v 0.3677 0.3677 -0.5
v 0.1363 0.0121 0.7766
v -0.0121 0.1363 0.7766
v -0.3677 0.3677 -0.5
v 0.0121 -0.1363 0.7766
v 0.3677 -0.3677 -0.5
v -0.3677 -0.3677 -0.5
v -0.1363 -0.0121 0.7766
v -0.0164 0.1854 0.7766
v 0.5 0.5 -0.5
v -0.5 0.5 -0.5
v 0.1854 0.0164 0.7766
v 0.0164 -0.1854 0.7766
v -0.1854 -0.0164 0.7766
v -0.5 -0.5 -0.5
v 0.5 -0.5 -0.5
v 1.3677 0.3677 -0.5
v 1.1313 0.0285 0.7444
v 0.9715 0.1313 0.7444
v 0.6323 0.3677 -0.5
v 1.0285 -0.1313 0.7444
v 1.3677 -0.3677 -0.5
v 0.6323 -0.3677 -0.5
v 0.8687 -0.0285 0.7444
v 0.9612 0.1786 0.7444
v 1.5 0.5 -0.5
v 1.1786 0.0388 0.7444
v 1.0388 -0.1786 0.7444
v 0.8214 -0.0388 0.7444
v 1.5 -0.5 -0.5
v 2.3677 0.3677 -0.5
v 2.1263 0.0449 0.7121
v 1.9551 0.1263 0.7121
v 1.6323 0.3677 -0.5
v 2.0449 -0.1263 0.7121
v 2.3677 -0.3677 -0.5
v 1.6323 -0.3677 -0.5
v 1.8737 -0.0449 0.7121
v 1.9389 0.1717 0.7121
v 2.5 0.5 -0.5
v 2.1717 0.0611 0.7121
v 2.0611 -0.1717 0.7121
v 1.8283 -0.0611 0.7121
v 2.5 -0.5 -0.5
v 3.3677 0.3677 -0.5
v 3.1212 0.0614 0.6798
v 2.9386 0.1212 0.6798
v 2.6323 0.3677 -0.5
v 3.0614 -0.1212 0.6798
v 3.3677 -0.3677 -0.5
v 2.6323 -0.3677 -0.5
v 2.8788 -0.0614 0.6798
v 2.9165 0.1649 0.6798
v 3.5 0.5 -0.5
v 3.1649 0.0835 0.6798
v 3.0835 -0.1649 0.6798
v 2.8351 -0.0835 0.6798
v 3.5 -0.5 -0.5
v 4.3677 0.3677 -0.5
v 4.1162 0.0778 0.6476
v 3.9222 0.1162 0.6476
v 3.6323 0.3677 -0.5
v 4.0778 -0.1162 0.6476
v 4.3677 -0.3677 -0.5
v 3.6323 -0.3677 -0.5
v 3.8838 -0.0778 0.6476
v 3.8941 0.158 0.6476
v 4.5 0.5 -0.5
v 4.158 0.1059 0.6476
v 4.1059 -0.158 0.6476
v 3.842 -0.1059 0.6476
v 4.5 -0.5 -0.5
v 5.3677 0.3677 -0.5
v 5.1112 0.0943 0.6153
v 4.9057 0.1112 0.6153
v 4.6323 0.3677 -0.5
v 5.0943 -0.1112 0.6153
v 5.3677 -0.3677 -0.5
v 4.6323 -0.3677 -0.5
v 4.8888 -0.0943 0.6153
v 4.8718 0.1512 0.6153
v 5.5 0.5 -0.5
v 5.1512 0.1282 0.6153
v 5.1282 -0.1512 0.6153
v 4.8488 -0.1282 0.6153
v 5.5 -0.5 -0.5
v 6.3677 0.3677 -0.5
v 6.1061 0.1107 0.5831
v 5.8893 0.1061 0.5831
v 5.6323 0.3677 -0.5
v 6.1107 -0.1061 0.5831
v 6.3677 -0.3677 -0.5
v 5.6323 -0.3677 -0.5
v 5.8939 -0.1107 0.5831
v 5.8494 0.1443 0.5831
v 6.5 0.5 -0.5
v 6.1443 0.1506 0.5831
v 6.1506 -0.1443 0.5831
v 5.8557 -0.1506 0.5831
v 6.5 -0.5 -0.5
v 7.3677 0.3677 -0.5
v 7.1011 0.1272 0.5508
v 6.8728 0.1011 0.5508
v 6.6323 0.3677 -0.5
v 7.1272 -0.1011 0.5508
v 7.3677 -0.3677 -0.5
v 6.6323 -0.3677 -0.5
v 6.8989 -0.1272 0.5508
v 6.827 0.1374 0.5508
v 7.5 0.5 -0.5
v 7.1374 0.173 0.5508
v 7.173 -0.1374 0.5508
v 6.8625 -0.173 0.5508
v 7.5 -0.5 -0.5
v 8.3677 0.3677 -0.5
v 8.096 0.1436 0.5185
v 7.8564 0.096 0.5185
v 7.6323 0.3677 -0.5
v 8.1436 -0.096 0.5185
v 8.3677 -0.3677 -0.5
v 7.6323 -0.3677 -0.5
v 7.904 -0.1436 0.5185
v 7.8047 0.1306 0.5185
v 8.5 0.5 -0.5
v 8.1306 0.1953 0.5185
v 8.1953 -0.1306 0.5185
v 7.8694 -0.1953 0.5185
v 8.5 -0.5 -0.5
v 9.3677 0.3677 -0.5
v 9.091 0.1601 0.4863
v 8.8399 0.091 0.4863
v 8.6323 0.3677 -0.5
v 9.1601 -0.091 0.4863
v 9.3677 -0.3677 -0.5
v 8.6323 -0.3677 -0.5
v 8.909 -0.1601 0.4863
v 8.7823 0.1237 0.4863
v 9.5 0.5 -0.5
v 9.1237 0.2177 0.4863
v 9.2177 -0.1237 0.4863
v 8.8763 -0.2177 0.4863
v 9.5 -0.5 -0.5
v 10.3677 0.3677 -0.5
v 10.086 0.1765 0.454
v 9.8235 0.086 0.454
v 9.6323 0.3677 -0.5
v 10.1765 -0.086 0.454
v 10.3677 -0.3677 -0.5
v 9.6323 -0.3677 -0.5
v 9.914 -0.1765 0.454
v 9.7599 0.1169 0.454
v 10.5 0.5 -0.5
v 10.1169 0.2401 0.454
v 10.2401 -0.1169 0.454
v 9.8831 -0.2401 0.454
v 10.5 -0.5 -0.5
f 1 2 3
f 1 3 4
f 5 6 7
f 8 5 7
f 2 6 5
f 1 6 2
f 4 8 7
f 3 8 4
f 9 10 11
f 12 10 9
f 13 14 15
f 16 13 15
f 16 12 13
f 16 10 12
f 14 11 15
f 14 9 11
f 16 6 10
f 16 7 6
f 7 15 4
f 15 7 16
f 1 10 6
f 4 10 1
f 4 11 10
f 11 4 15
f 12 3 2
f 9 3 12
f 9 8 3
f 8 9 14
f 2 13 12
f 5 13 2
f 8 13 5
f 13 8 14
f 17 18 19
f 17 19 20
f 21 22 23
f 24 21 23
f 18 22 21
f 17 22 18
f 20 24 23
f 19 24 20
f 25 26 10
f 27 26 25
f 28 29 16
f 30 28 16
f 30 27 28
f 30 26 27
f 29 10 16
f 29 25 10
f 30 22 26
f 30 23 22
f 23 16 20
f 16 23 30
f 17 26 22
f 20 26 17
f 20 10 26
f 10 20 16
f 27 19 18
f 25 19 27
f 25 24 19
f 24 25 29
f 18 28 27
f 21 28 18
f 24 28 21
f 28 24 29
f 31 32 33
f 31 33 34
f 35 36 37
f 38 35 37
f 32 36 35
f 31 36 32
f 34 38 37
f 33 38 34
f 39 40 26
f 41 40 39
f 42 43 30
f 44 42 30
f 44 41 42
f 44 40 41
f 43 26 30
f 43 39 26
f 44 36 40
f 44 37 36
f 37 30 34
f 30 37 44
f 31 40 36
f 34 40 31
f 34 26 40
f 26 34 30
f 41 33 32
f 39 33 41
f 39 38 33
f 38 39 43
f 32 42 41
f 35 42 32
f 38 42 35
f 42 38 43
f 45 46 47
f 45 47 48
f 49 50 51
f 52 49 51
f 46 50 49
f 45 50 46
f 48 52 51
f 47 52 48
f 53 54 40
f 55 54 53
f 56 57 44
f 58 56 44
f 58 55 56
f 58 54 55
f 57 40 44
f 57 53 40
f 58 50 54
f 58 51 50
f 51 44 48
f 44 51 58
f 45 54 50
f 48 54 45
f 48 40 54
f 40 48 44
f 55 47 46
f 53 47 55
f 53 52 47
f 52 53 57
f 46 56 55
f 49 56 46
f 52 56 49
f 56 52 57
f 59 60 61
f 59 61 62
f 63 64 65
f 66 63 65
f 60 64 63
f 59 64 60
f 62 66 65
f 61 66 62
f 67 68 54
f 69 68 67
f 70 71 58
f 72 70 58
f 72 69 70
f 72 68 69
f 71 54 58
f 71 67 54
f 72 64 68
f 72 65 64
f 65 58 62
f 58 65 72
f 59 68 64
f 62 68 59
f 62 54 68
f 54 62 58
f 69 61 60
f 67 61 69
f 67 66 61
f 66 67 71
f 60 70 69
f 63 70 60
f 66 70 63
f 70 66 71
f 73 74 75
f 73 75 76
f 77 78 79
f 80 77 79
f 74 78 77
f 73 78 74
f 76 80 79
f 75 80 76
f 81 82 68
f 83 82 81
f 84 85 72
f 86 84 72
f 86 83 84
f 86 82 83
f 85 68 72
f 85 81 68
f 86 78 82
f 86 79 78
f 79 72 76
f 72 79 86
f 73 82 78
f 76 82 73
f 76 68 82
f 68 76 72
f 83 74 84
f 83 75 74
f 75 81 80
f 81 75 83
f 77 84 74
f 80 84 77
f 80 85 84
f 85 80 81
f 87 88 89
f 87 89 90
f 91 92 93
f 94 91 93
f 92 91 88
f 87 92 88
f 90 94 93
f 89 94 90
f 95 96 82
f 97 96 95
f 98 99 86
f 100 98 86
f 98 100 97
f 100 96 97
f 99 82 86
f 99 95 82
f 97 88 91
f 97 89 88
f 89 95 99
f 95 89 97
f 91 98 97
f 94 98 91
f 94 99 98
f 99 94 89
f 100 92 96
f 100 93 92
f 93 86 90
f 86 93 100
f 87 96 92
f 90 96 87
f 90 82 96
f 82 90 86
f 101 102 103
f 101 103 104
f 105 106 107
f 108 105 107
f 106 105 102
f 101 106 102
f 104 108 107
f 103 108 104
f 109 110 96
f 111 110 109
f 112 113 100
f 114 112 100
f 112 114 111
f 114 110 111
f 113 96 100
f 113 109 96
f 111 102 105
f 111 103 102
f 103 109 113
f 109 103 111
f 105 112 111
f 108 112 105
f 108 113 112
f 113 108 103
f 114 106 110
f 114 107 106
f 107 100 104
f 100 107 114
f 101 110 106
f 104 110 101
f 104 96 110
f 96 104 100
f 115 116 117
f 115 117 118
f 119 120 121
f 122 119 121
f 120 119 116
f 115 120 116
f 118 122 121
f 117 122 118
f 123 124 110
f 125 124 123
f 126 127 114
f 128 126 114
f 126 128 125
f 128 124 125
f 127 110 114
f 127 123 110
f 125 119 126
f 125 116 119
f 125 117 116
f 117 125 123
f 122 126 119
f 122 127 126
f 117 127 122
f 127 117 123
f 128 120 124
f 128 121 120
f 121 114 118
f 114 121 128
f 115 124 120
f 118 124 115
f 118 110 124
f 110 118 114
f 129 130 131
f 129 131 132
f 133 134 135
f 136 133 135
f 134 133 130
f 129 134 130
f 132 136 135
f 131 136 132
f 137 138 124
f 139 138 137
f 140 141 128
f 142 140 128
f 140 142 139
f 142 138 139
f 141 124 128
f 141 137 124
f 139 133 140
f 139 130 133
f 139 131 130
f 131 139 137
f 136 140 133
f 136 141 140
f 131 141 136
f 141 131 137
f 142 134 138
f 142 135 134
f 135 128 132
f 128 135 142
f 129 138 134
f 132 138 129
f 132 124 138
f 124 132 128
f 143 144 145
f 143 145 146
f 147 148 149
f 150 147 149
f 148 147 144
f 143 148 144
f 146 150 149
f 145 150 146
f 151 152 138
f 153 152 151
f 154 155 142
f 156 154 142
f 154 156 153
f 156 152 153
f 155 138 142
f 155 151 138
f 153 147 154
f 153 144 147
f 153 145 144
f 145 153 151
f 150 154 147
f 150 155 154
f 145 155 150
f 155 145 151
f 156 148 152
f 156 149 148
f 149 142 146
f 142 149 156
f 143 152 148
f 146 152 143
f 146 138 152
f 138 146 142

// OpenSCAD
//Start with Dimensions
pvalue = 20; // [10.0:20.0]
/* [Hidden] */

points_01 = [[-0.048376, -0.463729, 0.131425], [0.463729, -0.048376, 0.131425], [-0.463729, 0.048376, 0.131425], [0.048376, 0.463729, 0.131425], [-0.5, 0.5, -0.5], [0.5, 0.5, -0.5], [-0.5, -0.5, -0.5], [0.5, -0.5, -0.5], [-0.341008, 0.035574, 0.131425], [0.035574, 0.341008, 0.131425], [0.36768, 0.36768, -0.5], [-0.36768, 0.36768, -0.5], [-0.36768, -0.36768, -0.5], [0.36768, -0.36768, -0.5], [0.341008, -0.035574, 0.131425], [-0.035574, -0.341008, 0.131425]];
triangles_01 = [[8, 9, 11], [11, 9, 10], [12, 13, 15], [15, 13, 14], [13, 10, 14], [14, 10, 9], [15, 8, 12], [12, 8, 11], [2, 4, 3], [3, 4, 5], [6, 0, 7], [7, 0, 1], [3, 5, 1], [1, 5, 7], [4, 2, 6], [6, 2, 0], [2, 3, 8], [8, 3, 9], [5, 4, 10], [10, 4, 11], [6, 7, 12], [12, 7, 13], [1, 0, 14], [14, 0, 15], [7, 5, 13], [13, 5, 10], [3, 1, 9], [9, 1, 14], [0, 2, 15], [15, 2, 8], [4, 6, 11], [11, 6, 12]];

points_02 = [[-0.185412, -0.01639, 0.776613], [0.01639, -0.185412, 0.776613], [-0.01639, 0.185412, 0.776613], [0.185412, 0.01639, 0.776613], [-0.5, 0.5, -0.5], [0.5, 0.5, -0.5], [-0.5, -0.5, -0.5], [0.5, -0.5, -0.5], [-0.012052, 0.136344, 0.776613], [0.136344, 0.012052, 0.776613], [0.36768, 0.36768, -0.5], [-0.36768, 0.36768, -0.5], [-0.36768, -0.36768, -0.5], [0.36768, -0.36768, -0.5], [0.012052, -0.136344, 0.776613], [-0.136344, -0.012052, 0.776613]];
triangles_02 = [[9, 10, 8], [8, 10, 11], [13, 14, 12], [12, 14, 15], [14, 13, 9], [9, 13, 10], [12, 15, 11], [11, 15, 8], [4, 5, 2], [2, 5, 3], [0, 1, 6], [6, 1, 7], [1, 3, 7], [7, 3, 5], [6, 4, 0], [0, 4, 2], [2, 3, 8], [8, 3, 9], [5, 4, 10], [10, 4, 11], [6, 7, 12], [12, 7, 13], [1, 0, 14], [14, 0, 15], [7, 5, 13], [13, 5, 10], [3, 1, 9], [9, 1, 14], [0, 2, 15], [15, 2, 8], [4, 6, 11], [11, 6, 12]];

vectors = points_01 - points_02;

for (i = [0:10]){
translate([i, 0, 0])
polyhedron(points=points_02+vectors*(i/pvalue), triangles=triangles_02);
}
